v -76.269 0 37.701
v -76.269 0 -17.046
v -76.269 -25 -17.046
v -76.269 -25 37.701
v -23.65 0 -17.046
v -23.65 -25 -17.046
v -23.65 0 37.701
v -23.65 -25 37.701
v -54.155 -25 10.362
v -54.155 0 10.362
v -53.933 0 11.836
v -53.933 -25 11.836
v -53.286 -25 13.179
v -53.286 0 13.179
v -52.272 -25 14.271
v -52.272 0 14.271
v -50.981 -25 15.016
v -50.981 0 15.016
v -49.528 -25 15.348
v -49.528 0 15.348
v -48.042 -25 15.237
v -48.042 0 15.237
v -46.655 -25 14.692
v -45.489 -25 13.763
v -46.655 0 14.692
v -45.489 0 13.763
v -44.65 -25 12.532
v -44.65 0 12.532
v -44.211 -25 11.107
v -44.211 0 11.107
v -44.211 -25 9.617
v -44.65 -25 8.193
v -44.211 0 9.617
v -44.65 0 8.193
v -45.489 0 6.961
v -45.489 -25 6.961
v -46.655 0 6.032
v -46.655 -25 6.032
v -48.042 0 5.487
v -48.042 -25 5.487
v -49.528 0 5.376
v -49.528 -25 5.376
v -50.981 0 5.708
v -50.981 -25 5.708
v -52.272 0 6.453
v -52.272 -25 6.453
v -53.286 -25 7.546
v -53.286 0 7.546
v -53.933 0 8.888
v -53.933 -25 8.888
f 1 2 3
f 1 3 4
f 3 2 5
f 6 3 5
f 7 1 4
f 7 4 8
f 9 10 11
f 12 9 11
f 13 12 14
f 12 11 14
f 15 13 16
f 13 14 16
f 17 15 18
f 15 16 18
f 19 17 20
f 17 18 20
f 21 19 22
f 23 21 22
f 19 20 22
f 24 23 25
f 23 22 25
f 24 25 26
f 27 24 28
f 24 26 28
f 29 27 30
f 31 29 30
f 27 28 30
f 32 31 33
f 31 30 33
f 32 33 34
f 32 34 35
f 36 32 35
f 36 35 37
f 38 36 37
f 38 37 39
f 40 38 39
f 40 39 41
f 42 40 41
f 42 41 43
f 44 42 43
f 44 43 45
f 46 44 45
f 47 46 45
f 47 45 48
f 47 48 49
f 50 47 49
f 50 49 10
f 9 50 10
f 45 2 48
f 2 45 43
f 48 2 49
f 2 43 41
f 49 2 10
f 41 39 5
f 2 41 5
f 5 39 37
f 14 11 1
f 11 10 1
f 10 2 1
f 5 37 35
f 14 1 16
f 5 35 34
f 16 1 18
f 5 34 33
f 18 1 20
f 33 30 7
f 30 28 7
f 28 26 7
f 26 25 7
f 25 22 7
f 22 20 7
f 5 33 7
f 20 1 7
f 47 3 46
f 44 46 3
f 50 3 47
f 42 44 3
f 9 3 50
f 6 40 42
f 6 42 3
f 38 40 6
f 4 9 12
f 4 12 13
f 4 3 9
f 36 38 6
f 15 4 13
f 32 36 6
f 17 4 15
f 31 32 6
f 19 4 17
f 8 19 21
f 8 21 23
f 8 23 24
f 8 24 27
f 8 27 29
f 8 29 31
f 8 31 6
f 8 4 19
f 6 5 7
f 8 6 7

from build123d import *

# Parameters (mm, degrees)
F0_W           = 144.8953971267
F0_H           = 132.3546804488
F1_DEPTH       = 25
F3_W           = 52.6192765683
F3_H           = 54.747434333
F4_DEPTH       = 25
F6_D           = 10
F6_DEPTH       = 50
F6_CBORE_D     = 10
F6_CBORE_DEPTH = 5
F6_TIP         = 3.0043030951


with BuildPart() as f1:
    # F0 (on Front) → F1 (new body)
    with BuildSketch(Plane.XZ):
        with Locations((-90.7013751566, -26.4289211482)):
            Rectangle(F0_W, F0_H)
    extrude(amount=F1_DEPTH)


with BuildPart() as f4:
    # F3 (on Front) → F4 (new body)
    with BuildSketch(Plane.XZ):
        with Locations((-49.9591687694, 10.3274388239)):
            Rectangle(F3_W, F3_H)
    extrude(amount=F4_DEPTH)

    # F6
    with Locations(Plane.XZ.offset(25)):
        with Locations((-49.1547472775, 10.3621119633)):
            CounterBoreHole(F6_D / 2, F6_CBORE_D / 2, F6_CBORE_DEPTH, depth=F6_DEPTH)
            with Locations((0, 0, -(F6_DEPTH + F6_TIP / 2))):  # 118° drill point
                Cone(0, F6_D / 2, F6_TIP, mode=Mode.SUBTRACT)


solid = f4.part
